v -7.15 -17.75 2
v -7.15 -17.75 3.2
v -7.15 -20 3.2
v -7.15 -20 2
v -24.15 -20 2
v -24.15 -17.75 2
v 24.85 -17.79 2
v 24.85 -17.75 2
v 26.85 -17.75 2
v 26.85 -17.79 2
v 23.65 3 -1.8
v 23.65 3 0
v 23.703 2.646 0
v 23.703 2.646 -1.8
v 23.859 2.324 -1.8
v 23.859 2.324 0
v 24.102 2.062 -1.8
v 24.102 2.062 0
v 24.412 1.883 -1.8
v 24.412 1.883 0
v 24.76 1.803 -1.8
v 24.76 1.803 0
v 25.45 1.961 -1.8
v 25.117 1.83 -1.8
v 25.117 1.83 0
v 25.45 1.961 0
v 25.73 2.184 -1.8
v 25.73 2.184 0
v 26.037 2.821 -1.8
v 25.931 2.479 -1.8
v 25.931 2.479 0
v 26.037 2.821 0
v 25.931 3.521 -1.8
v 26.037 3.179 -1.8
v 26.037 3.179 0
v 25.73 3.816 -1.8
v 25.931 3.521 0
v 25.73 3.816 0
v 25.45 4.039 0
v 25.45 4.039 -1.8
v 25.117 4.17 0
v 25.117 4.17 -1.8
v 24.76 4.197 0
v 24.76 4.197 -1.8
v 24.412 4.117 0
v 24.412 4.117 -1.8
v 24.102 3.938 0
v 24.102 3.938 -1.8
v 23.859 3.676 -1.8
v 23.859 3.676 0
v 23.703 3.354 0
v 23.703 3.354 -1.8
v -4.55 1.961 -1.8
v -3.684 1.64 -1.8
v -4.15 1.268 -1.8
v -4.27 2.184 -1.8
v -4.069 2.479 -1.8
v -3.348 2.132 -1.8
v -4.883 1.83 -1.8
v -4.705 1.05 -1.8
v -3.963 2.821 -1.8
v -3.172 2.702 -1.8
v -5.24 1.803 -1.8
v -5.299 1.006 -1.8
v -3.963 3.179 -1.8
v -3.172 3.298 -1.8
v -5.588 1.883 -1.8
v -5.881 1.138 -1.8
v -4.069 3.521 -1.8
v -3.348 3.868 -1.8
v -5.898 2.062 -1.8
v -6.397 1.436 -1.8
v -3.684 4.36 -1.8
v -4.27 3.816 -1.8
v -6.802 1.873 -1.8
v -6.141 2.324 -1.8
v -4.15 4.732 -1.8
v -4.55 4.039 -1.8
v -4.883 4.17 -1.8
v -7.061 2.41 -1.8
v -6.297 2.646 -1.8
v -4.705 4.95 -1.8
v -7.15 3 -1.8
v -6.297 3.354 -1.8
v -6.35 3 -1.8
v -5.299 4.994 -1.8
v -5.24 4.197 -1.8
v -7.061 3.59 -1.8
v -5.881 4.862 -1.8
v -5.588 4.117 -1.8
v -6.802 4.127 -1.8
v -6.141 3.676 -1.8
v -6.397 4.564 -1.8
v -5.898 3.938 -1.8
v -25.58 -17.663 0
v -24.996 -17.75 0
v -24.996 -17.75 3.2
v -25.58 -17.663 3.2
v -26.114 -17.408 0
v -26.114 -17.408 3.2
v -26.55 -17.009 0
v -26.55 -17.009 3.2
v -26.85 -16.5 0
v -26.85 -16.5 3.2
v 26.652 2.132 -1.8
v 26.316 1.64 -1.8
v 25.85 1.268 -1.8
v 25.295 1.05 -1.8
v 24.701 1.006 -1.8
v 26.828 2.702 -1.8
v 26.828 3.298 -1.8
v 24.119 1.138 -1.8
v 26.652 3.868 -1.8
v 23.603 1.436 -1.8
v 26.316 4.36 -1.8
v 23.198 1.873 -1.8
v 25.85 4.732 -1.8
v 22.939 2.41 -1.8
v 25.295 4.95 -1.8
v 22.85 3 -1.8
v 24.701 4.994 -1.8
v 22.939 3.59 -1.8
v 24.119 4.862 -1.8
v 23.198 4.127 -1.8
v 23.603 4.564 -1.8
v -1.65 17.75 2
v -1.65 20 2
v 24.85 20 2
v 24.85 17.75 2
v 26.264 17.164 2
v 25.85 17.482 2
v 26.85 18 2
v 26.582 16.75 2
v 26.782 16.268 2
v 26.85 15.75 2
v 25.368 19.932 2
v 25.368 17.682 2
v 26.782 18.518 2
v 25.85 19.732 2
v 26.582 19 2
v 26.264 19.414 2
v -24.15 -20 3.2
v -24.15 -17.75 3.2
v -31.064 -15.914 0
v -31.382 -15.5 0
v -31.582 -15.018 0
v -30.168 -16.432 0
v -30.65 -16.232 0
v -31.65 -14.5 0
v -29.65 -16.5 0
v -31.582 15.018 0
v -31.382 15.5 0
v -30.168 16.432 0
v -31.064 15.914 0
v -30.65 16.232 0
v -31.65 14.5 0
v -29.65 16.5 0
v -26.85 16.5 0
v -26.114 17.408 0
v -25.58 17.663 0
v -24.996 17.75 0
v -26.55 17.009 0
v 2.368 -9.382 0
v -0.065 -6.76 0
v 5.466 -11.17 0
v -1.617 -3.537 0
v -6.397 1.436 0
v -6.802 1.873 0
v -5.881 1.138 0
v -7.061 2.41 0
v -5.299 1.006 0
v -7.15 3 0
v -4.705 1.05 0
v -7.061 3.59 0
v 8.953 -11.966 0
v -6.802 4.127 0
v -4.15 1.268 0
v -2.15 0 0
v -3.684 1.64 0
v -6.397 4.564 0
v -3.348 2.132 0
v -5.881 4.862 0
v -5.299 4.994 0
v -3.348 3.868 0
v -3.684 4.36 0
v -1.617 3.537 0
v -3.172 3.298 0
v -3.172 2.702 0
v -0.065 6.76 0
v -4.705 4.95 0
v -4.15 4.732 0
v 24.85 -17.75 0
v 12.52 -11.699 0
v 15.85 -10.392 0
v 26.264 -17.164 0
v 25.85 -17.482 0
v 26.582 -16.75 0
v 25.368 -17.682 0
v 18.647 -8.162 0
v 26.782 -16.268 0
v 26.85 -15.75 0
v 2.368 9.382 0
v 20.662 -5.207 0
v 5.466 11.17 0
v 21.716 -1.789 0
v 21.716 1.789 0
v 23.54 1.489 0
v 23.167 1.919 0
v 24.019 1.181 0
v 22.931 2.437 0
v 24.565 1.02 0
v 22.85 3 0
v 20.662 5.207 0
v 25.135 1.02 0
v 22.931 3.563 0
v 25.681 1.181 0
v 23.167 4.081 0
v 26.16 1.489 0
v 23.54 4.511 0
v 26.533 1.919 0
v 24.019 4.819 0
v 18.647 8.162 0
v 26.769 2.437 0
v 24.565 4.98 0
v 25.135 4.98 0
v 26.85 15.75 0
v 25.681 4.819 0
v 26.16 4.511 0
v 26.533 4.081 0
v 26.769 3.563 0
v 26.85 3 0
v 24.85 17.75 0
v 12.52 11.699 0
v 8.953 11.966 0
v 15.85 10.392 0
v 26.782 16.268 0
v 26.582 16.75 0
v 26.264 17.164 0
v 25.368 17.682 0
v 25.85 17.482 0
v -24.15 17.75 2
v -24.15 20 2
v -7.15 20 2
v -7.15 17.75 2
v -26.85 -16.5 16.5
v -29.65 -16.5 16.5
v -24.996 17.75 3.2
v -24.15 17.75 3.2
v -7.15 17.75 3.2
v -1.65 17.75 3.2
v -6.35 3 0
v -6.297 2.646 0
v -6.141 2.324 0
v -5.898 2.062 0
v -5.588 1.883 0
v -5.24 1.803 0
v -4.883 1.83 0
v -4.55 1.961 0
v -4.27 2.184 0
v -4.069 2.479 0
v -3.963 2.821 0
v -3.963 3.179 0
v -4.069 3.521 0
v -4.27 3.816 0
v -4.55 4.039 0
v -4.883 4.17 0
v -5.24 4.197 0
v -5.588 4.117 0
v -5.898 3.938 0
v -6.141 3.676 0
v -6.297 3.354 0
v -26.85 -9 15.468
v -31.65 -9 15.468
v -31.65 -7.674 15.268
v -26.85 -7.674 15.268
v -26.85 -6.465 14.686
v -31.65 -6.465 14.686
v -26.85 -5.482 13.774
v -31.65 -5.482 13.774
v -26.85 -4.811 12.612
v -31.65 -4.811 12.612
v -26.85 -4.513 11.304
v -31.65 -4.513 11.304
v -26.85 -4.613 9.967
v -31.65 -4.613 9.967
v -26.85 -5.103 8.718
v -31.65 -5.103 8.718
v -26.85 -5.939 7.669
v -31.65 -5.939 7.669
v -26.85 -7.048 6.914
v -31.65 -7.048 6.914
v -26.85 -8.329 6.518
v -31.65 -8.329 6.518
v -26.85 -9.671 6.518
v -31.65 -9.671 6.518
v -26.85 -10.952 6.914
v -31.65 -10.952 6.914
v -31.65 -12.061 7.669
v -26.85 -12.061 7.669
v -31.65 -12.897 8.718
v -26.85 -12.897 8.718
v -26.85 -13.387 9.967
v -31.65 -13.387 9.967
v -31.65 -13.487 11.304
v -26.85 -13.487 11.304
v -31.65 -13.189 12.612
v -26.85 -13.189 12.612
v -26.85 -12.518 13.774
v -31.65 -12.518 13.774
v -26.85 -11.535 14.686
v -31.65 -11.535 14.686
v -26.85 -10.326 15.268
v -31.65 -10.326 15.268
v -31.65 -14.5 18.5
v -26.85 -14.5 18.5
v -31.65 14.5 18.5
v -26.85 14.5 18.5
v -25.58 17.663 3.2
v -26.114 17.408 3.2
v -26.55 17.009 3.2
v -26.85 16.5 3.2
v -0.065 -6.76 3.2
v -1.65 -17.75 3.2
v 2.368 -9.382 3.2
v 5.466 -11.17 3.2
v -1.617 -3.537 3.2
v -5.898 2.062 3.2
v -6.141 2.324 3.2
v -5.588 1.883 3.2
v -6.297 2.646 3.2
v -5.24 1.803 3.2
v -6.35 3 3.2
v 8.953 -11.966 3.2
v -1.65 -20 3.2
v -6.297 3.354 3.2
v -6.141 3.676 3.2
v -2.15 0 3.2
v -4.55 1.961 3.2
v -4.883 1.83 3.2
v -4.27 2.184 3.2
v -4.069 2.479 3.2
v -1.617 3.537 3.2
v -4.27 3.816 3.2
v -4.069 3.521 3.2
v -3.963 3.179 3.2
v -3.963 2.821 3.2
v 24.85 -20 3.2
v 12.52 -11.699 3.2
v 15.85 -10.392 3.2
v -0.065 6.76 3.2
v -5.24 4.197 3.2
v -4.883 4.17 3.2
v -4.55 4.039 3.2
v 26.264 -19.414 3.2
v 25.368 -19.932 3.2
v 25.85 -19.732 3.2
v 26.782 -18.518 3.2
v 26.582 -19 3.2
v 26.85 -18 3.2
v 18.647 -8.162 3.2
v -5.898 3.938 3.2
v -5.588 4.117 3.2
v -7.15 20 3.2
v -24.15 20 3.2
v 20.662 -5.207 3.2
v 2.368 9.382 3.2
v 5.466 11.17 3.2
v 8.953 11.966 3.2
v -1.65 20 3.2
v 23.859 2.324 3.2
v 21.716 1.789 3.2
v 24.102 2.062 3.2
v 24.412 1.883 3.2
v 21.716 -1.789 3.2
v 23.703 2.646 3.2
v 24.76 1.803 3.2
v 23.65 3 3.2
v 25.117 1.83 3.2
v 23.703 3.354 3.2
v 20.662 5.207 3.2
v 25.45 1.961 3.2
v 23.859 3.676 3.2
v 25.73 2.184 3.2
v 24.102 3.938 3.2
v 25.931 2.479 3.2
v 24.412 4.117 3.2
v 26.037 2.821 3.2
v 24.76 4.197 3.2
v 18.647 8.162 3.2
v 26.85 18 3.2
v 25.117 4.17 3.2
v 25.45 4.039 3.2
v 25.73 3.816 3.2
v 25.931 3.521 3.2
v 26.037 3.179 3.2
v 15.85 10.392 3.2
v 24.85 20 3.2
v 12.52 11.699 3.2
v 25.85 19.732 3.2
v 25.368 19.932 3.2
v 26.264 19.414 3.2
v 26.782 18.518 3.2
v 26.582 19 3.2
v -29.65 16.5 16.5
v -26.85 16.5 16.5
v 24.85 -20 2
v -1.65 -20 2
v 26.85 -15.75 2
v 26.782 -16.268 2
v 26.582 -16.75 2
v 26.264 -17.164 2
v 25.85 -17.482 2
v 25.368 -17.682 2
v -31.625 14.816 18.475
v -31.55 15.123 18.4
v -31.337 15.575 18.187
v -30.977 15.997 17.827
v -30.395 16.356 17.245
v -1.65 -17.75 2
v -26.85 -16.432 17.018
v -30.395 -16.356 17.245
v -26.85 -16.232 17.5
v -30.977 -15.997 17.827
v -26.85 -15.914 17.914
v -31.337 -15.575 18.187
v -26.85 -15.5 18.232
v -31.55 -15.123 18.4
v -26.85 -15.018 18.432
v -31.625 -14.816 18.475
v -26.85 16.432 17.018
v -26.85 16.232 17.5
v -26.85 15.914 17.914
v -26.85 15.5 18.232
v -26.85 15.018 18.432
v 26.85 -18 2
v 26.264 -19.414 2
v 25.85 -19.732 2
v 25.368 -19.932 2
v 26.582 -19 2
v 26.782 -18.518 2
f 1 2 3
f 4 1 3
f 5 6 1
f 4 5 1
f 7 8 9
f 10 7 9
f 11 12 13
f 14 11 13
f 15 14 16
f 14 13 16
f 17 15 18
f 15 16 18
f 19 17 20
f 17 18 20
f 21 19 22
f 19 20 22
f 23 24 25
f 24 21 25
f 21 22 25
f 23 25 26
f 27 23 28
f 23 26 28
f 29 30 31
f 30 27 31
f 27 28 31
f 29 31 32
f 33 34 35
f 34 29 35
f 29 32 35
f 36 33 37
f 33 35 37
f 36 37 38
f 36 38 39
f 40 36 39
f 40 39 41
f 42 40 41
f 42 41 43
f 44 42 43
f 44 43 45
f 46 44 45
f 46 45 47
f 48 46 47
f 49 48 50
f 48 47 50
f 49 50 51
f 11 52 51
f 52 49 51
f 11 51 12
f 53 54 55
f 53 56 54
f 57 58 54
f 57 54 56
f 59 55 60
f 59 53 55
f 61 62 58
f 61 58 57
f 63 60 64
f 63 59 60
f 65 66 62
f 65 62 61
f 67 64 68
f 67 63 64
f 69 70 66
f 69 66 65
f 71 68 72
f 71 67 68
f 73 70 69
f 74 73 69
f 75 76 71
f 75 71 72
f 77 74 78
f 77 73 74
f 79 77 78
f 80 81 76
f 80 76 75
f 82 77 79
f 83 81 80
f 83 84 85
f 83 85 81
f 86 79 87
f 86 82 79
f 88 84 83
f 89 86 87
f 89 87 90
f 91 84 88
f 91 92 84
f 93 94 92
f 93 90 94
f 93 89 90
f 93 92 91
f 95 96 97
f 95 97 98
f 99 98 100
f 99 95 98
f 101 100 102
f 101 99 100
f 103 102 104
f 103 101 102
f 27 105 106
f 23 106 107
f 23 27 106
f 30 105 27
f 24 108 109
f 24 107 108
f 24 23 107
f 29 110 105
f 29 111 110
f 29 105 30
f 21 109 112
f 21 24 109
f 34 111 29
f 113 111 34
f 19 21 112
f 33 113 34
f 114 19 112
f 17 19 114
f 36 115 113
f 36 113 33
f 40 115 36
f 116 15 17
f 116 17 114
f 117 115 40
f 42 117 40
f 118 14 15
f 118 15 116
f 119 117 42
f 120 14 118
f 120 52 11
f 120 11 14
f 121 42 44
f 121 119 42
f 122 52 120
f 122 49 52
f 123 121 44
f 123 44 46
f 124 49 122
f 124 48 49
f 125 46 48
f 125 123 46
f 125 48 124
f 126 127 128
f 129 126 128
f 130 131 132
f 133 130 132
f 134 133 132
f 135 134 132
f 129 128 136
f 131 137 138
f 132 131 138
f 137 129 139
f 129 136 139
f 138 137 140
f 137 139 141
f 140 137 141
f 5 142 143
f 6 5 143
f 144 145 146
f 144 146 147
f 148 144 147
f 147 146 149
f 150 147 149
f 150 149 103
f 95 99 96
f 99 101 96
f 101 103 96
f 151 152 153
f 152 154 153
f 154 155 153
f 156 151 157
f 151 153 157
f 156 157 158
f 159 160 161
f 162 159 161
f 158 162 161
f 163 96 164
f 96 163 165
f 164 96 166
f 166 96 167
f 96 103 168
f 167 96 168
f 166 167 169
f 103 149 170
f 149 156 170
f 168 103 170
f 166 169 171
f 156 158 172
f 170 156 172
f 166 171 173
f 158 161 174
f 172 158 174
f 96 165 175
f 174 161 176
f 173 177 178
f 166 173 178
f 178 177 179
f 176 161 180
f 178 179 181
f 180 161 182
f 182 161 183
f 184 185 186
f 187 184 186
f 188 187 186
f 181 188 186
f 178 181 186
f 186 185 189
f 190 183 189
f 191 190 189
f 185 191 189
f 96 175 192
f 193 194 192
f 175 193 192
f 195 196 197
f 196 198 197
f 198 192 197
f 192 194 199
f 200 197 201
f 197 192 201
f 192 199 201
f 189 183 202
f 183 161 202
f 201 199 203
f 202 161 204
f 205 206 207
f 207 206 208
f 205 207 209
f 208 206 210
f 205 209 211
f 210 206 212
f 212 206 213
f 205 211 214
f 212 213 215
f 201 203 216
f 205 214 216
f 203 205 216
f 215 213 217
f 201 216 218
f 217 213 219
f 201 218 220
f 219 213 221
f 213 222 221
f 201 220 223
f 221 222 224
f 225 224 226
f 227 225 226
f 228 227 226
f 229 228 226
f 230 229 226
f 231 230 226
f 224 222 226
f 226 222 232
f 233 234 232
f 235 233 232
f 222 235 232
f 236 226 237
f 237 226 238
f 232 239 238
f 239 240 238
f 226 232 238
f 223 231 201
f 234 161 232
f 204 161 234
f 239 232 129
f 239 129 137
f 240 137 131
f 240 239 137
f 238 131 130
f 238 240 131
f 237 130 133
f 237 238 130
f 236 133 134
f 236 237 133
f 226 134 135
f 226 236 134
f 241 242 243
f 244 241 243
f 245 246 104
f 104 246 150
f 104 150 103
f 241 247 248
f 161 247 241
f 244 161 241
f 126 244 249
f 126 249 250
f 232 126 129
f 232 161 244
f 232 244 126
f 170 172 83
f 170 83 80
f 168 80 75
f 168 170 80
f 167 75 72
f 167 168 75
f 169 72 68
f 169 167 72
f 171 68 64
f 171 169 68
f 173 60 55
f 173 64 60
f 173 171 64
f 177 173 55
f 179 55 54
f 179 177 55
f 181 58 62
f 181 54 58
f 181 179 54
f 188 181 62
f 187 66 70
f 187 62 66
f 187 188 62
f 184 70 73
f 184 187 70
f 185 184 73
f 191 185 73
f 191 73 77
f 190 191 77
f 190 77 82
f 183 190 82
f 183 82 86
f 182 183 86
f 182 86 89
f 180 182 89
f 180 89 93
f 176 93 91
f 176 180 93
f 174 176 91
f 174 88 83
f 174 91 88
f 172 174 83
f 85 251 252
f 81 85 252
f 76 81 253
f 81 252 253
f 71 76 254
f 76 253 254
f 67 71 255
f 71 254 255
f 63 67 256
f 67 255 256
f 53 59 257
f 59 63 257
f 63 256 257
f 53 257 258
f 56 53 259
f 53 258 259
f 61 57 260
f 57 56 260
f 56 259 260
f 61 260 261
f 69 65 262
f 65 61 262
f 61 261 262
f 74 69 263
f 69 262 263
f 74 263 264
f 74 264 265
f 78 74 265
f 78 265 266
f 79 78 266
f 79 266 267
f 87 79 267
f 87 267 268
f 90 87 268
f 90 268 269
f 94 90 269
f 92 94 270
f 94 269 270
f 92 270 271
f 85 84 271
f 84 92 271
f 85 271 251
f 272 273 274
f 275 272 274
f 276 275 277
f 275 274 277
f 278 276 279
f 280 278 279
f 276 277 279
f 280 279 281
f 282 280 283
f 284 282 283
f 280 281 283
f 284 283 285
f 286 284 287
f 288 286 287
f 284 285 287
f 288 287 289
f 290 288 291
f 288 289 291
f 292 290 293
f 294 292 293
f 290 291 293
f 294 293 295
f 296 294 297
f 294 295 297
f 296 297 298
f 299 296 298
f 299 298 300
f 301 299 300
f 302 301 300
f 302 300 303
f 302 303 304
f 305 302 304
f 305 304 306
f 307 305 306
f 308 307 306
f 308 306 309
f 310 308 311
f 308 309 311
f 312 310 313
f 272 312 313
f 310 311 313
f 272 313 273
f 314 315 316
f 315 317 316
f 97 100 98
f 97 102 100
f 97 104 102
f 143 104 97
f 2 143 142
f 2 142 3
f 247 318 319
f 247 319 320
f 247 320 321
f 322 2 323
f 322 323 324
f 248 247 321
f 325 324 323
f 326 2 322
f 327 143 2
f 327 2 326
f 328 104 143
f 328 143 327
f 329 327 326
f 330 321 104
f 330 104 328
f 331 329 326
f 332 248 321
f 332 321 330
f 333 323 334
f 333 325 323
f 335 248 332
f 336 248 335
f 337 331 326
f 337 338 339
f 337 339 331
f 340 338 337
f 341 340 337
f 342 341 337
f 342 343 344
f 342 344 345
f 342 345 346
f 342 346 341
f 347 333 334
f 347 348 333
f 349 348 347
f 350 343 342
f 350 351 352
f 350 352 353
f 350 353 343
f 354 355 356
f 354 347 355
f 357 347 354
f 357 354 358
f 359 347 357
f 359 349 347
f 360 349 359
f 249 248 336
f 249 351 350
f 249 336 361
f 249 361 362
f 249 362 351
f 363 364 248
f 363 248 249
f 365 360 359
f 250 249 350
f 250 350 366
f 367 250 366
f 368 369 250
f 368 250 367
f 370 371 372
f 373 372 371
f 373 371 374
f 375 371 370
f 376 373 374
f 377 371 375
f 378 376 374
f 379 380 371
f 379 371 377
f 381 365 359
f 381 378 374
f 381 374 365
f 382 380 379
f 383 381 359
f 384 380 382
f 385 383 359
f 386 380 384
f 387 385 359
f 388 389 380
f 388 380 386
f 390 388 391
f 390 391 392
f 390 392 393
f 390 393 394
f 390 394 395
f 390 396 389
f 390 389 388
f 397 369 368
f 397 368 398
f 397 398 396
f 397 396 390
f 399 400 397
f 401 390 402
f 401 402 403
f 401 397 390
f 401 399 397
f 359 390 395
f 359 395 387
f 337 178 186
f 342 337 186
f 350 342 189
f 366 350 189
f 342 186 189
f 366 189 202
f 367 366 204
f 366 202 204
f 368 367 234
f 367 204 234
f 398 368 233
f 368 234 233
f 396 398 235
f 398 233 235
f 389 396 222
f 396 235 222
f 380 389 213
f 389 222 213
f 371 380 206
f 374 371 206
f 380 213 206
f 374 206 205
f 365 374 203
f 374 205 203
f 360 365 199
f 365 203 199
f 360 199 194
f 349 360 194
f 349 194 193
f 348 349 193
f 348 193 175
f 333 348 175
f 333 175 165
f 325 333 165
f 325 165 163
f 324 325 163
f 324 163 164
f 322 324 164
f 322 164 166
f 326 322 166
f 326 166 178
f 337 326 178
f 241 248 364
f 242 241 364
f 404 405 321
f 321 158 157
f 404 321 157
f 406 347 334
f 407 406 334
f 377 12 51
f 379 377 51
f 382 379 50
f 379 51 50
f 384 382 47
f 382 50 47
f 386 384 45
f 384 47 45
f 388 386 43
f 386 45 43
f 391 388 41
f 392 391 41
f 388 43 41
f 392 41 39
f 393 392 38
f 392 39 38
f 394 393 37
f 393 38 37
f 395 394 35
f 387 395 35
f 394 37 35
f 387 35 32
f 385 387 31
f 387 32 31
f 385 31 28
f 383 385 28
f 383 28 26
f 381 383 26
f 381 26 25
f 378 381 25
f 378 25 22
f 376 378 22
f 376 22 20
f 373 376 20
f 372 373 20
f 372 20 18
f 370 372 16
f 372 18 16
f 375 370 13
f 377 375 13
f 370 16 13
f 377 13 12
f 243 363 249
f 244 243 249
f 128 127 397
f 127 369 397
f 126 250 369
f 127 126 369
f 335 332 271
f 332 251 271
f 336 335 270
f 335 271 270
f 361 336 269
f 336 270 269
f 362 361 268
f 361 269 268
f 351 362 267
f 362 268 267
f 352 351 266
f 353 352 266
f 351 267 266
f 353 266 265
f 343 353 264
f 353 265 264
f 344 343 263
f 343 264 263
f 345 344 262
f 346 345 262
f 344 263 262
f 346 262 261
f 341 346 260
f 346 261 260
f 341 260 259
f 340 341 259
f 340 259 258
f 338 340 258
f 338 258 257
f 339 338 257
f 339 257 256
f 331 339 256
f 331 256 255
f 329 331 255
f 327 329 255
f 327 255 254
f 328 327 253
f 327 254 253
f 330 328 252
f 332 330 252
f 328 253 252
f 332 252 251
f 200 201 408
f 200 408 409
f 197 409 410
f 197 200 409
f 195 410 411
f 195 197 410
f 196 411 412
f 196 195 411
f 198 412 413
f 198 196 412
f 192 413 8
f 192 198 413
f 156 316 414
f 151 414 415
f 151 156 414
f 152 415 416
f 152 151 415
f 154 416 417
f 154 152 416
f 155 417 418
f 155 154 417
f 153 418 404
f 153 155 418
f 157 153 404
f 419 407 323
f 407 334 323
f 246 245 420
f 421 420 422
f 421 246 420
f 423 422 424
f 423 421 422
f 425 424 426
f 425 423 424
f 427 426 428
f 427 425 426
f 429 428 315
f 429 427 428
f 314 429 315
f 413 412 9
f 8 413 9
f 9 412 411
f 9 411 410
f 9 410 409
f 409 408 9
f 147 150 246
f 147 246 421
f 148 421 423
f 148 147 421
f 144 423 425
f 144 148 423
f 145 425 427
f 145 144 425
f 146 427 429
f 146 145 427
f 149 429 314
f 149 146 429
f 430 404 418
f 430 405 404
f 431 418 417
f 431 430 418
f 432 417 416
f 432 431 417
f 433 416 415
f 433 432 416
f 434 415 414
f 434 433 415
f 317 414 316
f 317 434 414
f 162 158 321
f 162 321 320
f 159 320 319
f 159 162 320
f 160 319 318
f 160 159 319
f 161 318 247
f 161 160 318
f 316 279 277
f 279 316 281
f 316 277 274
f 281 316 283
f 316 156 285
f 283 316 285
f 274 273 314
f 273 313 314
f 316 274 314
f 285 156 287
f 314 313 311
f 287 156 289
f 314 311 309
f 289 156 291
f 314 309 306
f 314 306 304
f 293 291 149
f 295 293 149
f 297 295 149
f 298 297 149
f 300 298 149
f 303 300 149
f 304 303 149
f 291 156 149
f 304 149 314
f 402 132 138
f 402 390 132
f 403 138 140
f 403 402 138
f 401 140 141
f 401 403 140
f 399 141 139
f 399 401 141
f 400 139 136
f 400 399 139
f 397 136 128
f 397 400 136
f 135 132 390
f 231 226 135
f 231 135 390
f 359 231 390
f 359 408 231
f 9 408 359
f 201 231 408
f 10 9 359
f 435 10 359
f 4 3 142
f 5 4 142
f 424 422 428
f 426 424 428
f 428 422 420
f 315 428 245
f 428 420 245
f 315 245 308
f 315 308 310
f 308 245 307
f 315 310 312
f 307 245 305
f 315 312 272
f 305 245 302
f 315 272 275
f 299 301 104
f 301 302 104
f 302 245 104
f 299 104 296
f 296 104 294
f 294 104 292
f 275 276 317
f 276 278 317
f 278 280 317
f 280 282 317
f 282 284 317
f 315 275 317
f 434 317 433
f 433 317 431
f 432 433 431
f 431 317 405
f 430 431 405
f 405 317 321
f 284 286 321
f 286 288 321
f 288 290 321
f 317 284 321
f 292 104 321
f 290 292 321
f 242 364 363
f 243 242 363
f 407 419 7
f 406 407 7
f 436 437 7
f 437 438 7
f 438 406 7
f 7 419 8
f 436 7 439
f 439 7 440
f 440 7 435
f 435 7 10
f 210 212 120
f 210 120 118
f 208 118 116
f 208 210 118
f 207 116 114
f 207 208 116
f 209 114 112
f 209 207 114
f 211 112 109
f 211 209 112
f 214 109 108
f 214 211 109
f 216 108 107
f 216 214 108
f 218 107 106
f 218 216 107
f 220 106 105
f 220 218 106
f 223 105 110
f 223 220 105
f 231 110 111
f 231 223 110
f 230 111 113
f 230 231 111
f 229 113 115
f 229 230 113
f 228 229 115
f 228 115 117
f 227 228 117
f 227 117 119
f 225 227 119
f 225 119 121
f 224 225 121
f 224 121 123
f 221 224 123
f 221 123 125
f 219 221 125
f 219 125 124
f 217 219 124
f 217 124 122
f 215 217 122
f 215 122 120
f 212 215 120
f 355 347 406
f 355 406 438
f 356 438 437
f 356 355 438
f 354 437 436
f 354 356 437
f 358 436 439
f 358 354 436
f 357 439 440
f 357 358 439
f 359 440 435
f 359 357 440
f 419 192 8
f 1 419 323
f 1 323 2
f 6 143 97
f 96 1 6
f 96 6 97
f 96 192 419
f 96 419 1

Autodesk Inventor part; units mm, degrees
ref_plane "YZ Plane" through (0, 0, 0) normal (1, 0, 0) x (0, 1, 0)
ref_plane "XZ Plane" through (0, 0, 0) normal (0, 1, 0) x (-1, 0, 0)
ref_plane "XY Plane" through (0, 0, 0) normal (0, 0, 1) x (1, 0, 0)
sketch "Эскиз1" plane through (0, 0, 0) normal (0, 0, 1) x (1, 0, 0)
  line L0 (-26.85, 17.75) -> (26.85, 17.75)
  line L1 (26.85, 17.75) -> (26.85, -17.75)
  line L2 (26.85, -17.75) -> (-26.85, -17.75)
  line L3 (-26.85, -17.75) -> (-26.85, 17.75)
  line L4 (-26.85, 17.75) -> (26.85, -17.75) construction
  line L5 (26.85, 17.75) -> (-26.85, -17.75) construction
  point P0 (0, 0)
  dimension "d0" = 53.7
  dimension "d1" = 35.5
extrude "Выдавливание1" add sketch "Эскиз1" along normal blind 3.2
sketch "Эскиз2" plane through (0, 0, 0) normal (0, 0, -1) x (-1, 0, 0)
  line L0 (31.65, -16.5) -> (26.85, -16.5)
  line L1 (26.85, -16.5) -> (26.85, 16.5)
  line L2 (26.85, 16.5) -> (31.65, 16.5)
  line L3 (31.65, 16.5) -> (31.65, -16.5)
  line L4 (31.65, -16.5) -> (26.85, 16.5) construction
  line L5 (26.85, -16.5) -> (31.65, 16.5) construction
  line L6 (26.85, 17.75) -> (26.85, -17.75) projected
  point P0 (0, 0)
  point P1 (29.25, 0)
  point P2 (26.85, 0)
  dimension "d4" = 4.8
  dimension "d5" = 33
extrude "Выдавливание2" add sketch "Эскиз2" against normal blind 18.5
sketch "Эскиз3" plane through (0, 0, 3.2) normal (0, 0, 1) x (1, 0, 0)
  line L0 (-1.65, 20) -> (26.85, 20)
  line L1 (26.85, 20) -> (26.85, -20)
  line L2 (26.85, -20) -> (-1.65, -20)
  line L3 (-1.65, -20) -> (-1.65, 20)
  line L4 (-1.65, 20) -> (26.85, -20) construction
  line L5 (26.85, 20) -> (-1.65, -20) construction
  line L6 (26.85, -17.75) -> (26.85, 17.75) projected
  line L7 (-24.15, 20) -> (-7.15, 20)
  line L8 (-7.15, 20) -> (-7.15, -20)
  line L9 (-7.15, -20) -> (-24.15, -20)
  line L10 (-24.15, -20) -> (-24.15, 20)
  line L11 (-24.15, 20) -> (-7.15, -20) construction
  line L12 (-7.15, 20) -> (-24.15, -20) construction
  point P0 (0, 0)
  point P1 (12.6, 0)
  point P2 (26.85, 0)
  point P3 (-15.65, 0)
  dimension "d8" = 28.5
  dimension "d9" = 40
  dimension "d10" = 17
  dimension "d11" = 40
  dimension "d12" = 5.5
extrude "Выдавливание3" add sketch "Эскиз3" against normal blind 1.2
sketch "Эскиз4" plane through (0, 0, 0) normal (0, 0, -1) x (-1, 0, 0)
  circle A0 centre (-9.85, 0) radius 12
  line L0 (-26.85, -17.75) -> (-26.85, 17.75) projected
  circle A1 centre (-24.85, 3) radius 2
  circle A2 centre (-24.85, 3) radius 1.2
  line L1 (-9.85, 0) -> (-9.85, 16.0932) construction
  circle A3 centre (5.15, 3) radius 2
  circle A4 centre (5.15, 3) radius 1.2
  line L2 (1.65, 20) -> (-26.85, 20) projected
  point P0 (0, 0)
  dimension "d15" = 24
  dimension "d16" = 17
  dimension "d17" = 4
  dimension "d18" = 2.4
  dimension "d19" = 30
  dimension "d20" = 17
extrude "Выдавливание4" cut sketch "Эскиз4" against normal up to next contours A0
extrude "Выдавливание5" add sketch "Эскиз4" along normal blind 1.8 contours A1 | A3
extrude "Выдавливание6" cut sketch "Эскиз4" against normal up to next contours A2 | A4
sketch "Эскиз5" plane through (-31.65, -16.5, 0) normal (-1, 0, 0) x (0, 0, 1)
  circle A0 centre (10.968, 7.5) radius 4.5
  line L0 (0, 0) -> (18.5, 0) projected
  point P0 (0, 16.5)
  dimension "d27" = 9
  dimension "d28" = 7.5
extrude "Выдавливание7" cut sketch "Эскиз5" against normal up to next
fillet "Сопряжение1" radius 2 10 edges at (-29.25, -16.5, 18.5) (-29.25, 16.5, 18.5) (-31.65, -16.5, 9.25) (-31.65, 16.5, 9.25) (26.85, 20, 2.6) (26.85, 17.75, 1) (26.85, -17.75, 1) (26.85, -20, 2.6) (-26.85, 17.75, 1.6) (-26.85, -17.75, 1.6)
properties part number "ЛЦМК000002.00.00.00.00.15"
